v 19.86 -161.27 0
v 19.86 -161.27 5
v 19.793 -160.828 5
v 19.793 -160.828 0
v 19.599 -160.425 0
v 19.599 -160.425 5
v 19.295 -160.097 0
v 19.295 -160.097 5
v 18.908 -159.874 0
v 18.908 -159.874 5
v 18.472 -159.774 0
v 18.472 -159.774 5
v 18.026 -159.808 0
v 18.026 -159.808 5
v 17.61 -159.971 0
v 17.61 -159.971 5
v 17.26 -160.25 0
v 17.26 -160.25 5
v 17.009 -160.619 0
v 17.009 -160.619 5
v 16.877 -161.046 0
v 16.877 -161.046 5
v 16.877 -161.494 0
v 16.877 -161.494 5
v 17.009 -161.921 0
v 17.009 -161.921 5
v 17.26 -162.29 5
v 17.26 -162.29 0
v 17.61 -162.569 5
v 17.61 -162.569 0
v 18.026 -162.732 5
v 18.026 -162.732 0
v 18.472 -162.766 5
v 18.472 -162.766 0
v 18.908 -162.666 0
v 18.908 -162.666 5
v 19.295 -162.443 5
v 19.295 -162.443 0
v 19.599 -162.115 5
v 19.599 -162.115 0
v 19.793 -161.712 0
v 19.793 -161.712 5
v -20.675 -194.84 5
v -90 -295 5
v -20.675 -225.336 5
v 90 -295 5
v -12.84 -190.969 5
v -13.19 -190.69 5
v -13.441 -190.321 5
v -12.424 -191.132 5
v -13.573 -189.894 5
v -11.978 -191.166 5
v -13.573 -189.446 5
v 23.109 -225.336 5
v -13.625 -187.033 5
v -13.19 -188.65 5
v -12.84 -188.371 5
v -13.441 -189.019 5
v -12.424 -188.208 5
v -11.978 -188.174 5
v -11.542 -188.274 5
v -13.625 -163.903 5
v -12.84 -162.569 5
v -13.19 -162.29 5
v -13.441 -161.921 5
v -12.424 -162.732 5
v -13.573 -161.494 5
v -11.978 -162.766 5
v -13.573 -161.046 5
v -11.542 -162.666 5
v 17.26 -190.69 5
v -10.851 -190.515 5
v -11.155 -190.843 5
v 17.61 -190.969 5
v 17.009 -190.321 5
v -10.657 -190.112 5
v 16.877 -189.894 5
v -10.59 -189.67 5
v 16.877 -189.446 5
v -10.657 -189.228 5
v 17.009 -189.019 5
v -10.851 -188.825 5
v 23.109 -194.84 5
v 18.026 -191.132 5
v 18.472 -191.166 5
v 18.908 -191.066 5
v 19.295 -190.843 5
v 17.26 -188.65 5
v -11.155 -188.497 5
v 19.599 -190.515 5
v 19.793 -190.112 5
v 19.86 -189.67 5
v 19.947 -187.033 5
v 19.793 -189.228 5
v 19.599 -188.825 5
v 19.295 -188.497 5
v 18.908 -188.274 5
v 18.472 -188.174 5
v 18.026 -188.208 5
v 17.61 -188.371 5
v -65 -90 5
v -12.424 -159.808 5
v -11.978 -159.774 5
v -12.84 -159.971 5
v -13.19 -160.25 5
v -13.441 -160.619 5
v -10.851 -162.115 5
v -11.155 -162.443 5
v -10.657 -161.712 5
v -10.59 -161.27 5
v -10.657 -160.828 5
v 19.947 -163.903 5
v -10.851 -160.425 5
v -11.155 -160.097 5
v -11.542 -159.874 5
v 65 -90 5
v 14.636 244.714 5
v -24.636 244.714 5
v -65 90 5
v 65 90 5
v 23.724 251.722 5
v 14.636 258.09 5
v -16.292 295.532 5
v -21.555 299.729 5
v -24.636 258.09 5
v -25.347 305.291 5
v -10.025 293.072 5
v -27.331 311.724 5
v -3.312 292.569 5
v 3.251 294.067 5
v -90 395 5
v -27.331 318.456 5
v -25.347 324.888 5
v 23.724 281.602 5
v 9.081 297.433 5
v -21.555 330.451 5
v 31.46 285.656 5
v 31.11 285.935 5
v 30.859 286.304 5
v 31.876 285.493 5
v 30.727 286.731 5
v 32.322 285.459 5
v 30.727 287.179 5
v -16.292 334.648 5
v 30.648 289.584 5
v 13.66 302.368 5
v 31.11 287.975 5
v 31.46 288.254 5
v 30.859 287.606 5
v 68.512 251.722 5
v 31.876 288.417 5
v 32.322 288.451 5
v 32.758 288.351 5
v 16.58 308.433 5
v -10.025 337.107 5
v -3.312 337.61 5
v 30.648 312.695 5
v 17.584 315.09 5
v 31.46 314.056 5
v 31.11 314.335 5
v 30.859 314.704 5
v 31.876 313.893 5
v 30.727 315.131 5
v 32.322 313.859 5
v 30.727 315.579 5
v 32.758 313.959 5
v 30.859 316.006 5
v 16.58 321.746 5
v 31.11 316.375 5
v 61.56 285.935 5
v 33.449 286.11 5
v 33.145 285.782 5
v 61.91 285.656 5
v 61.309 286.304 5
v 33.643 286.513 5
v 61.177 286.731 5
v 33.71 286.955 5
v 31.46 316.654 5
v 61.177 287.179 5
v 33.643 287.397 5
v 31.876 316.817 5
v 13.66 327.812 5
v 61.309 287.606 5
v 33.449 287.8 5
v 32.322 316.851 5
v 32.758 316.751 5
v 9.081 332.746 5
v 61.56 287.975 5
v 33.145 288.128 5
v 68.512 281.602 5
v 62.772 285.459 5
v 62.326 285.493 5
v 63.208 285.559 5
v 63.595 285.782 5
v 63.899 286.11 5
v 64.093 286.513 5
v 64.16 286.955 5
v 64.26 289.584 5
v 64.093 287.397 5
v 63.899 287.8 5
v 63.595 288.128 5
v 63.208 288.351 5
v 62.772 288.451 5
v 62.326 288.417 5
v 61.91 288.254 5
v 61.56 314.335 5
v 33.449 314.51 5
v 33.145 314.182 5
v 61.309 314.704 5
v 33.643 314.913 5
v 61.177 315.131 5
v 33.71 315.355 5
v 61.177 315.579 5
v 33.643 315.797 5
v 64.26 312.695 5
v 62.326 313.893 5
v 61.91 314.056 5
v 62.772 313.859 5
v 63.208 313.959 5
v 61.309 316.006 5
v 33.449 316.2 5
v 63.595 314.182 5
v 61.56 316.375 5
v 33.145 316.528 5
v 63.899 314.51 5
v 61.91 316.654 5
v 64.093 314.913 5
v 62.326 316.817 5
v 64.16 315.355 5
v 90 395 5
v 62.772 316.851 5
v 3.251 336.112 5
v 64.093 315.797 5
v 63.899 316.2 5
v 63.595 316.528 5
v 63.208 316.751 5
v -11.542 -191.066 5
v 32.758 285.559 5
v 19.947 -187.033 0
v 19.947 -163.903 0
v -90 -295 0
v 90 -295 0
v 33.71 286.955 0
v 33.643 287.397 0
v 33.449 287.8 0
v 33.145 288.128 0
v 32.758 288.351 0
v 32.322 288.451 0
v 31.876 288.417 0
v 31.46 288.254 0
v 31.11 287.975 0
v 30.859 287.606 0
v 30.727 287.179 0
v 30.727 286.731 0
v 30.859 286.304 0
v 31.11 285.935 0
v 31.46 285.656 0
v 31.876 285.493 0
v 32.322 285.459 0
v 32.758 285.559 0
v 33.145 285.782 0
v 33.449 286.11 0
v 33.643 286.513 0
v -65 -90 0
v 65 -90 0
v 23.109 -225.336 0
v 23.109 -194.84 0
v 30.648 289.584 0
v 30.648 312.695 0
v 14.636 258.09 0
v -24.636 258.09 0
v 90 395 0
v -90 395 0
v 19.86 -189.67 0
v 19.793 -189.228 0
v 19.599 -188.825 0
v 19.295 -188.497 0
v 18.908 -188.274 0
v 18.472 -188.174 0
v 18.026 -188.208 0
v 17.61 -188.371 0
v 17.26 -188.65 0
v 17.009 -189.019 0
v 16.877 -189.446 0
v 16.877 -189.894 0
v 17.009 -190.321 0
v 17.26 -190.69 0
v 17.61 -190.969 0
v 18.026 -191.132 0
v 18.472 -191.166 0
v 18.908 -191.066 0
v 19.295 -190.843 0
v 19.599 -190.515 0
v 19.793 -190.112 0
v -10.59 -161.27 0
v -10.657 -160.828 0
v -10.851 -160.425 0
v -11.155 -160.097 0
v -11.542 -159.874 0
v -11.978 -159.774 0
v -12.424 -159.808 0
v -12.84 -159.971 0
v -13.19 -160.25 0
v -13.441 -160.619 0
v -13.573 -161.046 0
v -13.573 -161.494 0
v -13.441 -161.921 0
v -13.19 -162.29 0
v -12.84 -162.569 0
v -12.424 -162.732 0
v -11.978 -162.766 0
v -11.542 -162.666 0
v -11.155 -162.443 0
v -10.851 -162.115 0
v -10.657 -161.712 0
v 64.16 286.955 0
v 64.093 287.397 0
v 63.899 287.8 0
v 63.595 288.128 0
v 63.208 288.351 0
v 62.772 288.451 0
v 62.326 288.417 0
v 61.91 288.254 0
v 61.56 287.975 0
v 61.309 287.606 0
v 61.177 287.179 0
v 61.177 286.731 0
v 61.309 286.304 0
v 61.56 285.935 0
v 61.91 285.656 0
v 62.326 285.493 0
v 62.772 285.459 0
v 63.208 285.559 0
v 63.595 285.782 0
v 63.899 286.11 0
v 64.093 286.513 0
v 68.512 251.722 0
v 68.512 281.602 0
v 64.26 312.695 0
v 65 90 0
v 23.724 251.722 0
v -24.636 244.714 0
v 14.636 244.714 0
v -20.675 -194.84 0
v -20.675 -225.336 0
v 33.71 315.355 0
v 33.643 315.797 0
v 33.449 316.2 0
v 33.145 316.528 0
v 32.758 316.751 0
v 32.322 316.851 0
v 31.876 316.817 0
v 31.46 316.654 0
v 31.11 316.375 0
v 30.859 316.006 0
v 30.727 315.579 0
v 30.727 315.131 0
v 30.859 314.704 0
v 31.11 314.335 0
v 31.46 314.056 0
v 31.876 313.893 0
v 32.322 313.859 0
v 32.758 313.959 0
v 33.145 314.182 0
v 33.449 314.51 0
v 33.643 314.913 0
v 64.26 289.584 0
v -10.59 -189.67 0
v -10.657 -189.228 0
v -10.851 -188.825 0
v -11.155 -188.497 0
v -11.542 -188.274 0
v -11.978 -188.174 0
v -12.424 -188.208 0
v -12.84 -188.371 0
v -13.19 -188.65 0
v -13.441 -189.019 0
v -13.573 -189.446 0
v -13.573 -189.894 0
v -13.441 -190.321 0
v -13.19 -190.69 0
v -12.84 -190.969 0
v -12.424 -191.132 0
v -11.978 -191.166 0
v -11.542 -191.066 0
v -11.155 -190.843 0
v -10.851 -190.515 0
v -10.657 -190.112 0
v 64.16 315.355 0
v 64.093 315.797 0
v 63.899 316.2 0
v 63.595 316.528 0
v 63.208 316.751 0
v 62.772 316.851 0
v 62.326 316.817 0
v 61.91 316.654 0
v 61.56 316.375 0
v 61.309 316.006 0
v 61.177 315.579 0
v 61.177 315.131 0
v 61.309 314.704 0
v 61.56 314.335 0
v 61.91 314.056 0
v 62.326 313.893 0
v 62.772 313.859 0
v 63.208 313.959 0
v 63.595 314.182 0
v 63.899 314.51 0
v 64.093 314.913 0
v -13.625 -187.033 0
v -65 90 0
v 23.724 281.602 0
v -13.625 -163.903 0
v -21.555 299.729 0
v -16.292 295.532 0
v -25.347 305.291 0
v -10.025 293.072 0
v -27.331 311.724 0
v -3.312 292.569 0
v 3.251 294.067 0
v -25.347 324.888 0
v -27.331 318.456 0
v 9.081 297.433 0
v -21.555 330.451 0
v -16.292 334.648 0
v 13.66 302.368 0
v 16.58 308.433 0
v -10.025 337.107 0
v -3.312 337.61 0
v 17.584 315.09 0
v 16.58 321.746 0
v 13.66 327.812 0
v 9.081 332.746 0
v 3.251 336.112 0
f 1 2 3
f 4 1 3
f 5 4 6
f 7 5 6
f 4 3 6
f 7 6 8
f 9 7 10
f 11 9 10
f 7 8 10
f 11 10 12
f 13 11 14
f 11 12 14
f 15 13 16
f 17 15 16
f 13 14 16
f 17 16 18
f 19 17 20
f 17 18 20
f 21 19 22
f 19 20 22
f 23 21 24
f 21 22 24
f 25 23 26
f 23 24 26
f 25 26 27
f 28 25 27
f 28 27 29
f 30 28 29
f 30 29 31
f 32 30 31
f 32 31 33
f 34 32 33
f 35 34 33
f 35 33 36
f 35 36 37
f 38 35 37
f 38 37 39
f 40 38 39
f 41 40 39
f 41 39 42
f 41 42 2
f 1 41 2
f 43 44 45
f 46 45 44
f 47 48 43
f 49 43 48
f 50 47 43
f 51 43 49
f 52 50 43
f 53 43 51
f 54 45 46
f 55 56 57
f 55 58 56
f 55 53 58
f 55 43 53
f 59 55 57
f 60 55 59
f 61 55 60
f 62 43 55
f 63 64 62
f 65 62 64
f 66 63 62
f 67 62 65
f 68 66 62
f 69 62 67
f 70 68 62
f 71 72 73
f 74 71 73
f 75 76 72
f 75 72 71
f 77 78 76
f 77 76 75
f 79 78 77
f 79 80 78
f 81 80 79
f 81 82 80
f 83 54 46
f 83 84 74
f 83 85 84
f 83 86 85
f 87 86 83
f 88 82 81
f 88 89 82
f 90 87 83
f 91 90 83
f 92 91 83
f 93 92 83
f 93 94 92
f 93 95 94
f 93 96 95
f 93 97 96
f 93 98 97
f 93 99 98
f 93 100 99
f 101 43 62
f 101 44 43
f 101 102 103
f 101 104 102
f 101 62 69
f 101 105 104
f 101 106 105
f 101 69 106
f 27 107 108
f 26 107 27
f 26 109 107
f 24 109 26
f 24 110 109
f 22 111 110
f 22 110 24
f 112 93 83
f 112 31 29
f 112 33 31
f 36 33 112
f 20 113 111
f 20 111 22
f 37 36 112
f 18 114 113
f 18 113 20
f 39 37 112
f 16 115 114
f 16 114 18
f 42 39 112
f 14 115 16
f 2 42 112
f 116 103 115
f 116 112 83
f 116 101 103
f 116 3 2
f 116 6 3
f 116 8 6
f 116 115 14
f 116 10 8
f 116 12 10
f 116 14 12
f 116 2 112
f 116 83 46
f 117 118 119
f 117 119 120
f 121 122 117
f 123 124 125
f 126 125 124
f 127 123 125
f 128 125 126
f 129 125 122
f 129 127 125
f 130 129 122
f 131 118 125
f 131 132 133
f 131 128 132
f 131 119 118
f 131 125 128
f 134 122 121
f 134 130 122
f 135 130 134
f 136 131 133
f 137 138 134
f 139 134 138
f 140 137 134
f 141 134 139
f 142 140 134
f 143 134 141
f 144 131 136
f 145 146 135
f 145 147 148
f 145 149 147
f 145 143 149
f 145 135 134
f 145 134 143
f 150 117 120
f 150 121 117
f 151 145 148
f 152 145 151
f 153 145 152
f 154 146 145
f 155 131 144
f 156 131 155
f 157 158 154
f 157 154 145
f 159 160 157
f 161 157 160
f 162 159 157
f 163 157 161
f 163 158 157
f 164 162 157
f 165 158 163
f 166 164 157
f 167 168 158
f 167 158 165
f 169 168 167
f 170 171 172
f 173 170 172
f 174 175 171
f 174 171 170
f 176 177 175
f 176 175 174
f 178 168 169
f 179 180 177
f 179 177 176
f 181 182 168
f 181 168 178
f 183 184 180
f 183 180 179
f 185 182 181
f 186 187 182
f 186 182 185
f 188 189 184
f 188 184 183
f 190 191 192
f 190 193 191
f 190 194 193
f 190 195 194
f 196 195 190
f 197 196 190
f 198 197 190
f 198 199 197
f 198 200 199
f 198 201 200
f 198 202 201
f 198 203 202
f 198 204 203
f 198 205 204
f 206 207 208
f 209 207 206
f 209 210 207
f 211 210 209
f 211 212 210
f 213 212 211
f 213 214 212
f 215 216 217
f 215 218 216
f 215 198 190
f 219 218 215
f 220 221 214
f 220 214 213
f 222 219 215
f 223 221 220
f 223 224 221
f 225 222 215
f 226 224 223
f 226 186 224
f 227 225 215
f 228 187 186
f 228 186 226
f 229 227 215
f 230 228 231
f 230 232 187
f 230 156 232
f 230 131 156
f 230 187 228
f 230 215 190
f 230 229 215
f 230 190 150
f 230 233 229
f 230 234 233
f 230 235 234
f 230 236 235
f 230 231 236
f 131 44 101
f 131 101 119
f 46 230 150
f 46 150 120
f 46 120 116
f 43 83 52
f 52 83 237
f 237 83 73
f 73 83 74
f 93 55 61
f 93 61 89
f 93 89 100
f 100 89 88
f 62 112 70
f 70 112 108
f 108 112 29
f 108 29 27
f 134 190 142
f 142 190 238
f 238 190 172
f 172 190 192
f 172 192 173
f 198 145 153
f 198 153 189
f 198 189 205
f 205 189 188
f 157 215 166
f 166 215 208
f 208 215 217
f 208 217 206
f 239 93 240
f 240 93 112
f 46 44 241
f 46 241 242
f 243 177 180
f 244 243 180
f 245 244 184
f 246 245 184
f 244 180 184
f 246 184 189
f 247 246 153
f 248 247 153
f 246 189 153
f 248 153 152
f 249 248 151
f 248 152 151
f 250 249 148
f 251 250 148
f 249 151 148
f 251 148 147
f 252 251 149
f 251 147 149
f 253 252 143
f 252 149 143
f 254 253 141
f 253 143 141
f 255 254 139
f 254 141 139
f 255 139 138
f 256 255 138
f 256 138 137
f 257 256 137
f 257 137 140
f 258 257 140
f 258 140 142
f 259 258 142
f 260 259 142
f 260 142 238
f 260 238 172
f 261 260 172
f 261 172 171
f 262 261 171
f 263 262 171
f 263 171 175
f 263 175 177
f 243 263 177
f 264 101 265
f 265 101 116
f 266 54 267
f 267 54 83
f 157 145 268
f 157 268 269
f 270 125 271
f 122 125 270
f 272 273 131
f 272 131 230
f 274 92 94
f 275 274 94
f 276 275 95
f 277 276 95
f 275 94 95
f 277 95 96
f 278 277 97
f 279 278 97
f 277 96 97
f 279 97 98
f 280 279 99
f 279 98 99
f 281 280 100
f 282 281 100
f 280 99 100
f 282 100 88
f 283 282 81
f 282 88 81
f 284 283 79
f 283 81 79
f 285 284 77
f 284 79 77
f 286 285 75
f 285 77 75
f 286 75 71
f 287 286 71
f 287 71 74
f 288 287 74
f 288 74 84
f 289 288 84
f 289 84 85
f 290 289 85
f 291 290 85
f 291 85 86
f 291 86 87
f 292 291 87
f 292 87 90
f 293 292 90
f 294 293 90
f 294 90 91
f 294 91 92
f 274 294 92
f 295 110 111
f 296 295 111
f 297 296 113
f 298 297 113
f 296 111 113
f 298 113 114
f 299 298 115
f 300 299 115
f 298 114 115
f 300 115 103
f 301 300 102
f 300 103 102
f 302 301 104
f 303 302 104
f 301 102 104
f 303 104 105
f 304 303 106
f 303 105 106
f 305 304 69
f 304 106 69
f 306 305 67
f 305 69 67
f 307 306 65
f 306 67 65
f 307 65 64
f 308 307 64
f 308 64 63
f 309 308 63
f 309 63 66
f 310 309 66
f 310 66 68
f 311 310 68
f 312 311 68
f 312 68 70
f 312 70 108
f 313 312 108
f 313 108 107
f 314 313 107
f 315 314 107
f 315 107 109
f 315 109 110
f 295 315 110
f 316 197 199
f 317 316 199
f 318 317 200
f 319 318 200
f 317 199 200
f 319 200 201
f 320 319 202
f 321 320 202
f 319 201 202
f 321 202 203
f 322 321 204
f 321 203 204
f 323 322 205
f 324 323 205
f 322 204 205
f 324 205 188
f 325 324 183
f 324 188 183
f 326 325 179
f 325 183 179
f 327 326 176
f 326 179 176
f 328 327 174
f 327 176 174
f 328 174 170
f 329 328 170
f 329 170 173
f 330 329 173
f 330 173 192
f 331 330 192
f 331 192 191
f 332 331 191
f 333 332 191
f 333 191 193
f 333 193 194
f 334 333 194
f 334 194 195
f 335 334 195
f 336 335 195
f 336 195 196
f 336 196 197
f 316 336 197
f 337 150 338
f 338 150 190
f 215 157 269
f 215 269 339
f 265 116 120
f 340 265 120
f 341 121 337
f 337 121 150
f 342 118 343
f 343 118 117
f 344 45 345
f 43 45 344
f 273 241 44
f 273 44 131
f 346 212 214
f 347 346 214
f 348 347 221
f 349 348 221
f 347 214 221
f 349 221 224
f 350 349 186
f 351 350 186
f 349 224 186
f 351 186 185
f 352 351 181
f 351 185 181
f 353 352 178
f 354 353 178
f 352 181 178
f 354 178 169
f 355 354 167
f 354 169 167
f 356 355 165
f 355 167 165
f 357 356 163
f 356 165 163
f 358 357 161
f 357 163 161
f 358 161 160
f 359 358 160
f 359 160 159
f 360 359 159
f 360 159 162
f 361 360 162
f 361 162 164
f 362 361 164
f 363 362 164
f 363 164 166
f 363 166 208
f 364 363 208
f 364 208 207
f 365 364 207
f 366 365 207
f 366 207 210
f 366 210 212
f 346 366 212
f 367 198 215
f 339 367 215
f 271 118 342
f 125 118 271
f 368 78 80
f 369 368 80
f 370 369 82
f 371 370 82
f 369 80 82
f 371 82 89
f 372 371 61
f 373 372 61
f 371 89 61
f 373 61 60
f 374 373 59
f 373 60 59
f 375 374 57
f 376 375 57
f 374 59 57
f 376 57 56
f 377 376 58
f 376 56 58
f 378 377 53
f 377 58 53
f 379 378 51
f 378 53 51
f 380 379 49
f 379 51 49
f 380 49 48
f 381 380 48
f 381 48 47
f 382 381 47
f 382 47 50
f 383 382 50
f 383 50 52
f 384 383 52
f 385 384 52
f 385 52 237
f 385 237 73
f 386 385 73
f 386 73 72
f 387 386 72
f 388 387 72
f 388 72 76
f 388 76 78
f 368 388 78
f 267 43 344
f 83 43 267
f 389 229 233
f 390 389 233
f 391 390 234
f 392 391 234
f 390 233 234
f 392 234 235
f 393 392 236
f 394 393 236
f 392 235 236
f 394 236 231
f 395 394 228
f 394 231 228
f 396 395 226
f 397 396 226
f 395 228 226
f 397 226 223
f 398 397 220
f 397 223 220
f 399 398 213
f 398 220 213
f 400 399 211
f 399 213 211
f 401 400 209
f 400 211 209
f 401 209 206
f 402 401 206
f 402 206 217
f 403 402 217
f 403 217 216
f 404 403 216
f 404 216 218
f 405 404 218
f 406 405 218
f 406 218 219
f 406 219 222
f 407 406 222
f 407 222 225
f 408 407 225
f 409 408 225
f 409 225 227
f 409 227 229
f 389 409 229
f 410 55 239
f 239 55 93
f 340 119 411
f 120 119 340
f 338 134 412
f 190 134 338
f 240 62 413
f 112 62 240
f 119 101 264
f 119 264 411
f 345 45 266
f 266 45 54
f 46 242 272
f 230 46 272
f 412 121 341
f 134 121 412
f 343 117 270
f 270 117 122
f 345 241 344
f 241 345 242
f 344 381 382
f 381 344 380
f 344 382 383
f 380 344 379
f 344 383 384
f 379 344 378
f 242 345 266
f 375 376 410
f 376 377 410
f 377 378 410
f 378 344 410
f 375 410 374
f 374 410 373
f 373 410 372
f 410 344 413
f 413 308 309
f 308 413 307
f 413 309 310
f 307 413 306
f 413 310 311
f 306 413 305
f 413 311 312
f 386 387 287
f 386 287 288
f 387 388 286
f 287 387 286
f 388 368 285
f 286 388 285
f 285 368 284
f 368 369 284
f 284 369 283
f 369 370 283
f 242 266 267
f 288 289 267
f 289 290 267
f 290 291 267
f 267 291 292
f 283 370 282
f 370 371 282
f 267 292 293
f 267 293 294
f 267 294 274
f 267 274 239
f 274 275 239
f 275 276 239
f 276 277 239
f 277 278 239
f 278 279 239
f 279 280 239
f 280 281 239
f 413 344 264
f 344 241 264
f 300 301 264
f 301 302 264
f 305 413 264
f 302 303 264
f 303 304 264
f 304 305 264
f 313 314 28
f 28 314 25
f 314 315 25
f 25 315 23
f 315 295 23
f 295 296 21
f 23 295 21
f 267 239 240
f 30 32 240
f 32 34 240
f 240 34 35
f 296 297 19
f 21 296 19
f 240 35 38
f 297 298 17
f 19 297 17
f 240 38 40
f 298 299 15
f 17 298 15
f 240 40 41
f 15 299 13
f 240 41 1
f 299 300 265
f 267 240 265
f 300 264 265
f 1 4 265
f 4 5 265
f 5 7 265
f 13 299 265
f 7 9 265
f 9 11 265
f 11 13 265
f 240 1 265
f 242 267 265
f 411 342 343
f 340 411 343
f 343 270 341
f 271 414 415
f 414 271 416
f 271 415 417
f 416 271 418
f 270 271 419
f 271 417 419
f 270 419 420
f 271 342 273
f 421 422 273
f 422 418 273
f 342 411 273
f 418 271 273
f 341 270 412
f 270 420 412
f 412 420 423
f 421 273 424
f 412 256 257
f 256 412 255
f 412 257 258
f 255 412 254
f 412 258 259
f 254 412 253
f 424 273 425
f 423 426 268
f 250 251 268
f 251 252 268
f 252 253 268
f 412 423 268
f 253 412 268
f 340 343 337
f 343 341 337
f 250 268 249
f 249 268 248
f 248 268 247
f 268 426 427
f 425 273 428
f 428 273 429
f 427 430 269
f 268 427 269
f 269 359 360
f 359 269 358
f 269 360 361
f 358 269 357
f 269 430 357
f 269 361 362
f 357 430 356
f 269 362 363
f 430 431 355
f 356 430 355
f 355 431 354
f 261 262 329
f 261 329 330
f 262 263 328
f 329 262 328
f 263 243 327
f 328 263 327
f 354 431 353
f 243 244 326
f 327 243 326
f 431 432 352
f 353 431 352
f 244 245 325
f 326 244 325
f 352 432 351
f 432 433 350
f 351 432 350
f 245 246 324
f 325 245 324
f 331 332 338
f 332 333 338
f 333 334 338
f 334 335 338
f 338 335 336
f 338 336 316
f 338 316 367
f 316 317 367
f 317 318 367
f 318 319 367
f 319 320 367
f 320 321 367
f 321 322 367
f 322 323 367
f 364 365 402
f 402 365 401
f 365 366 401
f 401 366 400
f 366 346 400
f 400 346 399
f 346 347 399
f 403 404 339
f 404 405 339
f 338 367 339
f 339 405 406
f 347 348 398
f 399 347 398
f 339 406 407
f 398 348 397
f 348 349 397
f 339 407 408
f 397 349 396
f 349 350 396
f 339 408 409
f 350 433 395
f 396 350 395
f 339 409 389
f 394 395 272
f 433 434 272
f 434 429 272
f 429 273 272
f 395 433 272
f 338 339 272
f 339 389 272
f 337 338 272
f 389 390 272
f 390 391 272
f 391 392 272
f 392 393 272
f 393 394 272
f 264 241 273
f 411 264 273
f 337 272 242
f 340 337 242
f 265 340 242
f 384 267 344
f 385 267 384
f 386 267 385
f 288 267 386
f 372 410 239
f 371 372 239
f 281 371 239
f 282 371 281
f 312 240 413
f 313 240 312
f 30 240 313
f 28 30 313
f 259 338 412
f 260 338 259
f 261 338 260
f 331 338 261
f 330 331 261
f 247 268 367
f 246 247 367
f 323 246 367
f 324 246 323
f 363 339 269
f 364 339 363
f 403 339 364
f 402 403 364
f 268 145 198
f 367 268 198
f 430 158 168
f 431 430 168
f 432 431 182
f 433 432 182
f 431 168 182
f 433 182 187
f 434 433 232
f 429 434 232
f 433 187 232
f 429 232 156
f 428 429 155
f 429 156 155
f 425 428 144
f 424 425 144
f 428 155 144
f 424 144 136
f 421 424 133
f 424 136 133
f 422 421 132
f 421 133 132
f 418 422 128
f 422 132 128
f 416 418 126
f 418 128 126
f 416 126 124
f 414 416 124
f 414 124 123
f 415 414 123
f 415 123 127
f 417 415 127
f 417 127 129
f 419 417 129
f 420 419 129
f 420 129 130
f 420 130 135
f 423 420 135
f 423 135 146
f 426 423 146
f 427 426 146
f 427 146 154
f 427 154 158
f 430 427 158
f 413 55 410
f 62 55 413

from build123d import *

# Parameters (mm, degrees)
ESQUISSE1_W             = 180
ESQUISSE1_H             = 790
BOSS_EXTRU_1_DEPTH      = 5
ESQUISSE2_W             = 130
ESQUISSE2_H             = 180
ENL_V_MAT_EXTRU_1_DEPTH = 406.154291598
ESQUISSE3_W             = 180
ESQUISSE3_H             = 100
ENL_V_MAT_EXTRU_2_DEPTH = 5
ESQUISSE4_R             = 22.583693943
ESQUISSE4_W             = 39.272250948
ESQUISSE4_H             = 13.375687181
ENL_V_MAT_EXTRU_3_DEPTH = 10
ESQUISSE6_R             = 1.5
ESQUISSE6_W             = 43.78333401
ESQUISSE6_H             = 30.495607997
ESQUISSE6_W_2           = 33.572233796
ESQUISSE6_H_2           = 23.130308998
ENL_V_MAT_EXTRU_4_DEPTH = 10
ESQUISSE7_R             = 1.5
ESQUISSE7_W             = 44.788511225
ESQUISSE7_H             = 29.879964446
ESQUISSE7_W_2           = 33.612496144
ESQUISSE7_H_2           = 23.111104951
ENL_V_MAT_EXTRU_5_DEPTH = 10


with BuildPart() as part:
    # Esquisse1 → Boss.-Extru.1 (new body)
    with BuildSketch(Plane.XY):
        Rectangle(ESQUISSE1_W, ESQUISSE1_H)
    extrude(amount=BOSS_EXTRU_1_DEPTH)

    # Esquisse2 → Enlèv. mat.-Extru.1 (cut, through all)
    with BuildSketch(Plane.XY.offset(5)):
        Rectangle(ESQUISSE2_W, ESQUISSE2_H)
    extrude(amount=-ENL_V_MAT_EXTRU_1_DEPTH, mode=Mode.SUBTRACT)

    # Esquisse3 → Enlèv. mat.-Extru.2 (cut)
    with BuildSketch(Plane.XY.offset(5)):
        with Locations((0, -345)):
            Rectangle(ESQUISSE3_W, ESQUISSE3_H)
    extrude(amount=-ENL_V_MAT_EXTRU_2_DEPTH, mode=Mode.SUBTRACT)

    # Esquisse4 → Enlèv. mat.-Extru.3 (cut)
    with BuildSketch(Plane.XY.offset(5)):
        with Locations((-5, 315.089745962)):
            Circle(ESQUISSE4_R)
        with Locations((-5, 251.402324932)):
            Rectangle(ESQUISSE4_W, ESQUISSE4_H)
    extrude(amount=-ENL_V_MAT_EXTRU_3_DEPTH, mode=Mode.SUBTRACT)

    # Esquisse6 → Enlèv. mat.-Extru.4 (cut)
    with BuildSketch(Plane.XY.offset(5)):
        with Locations((-12.09, -189.669997694)):
            Circle(ESQUISSE6_R)
        with Locations((18.36, -189.669997694)):
            Circle(ESQUISSE6_R)
        with Locations((18.36, -161.269997694)):
            Circle(ESQUISSE6_R)
        with Locations((-12.09, -161.269997694)):
            Circle(ESQUISSE6_R)
        with Locations((1.217144904, -210.087843678)):
            Rectangle(ESQUISSE6_W, ESQUISSE6_H)
        with Locations((3.160802391, -175.467764734)):
            Rectangle(ESQUISSE6_W_2, ESQUISSE6_H_2)
    extrude(amount=-ENL_V_MAT_EXTRU_4_DEPTH, mode=Mode.SUBTRACT)

    # Esquisse7 → Enlèv. mat.-Extru.5 (cut)
    with BuildSketch(Plane.XY.offset(5)):
        with Locations((62.66, 315.355)):
            Circle(ESQUISSE7_R)
        with Locations((32.21, 315.355)):
            Circle(ESQUISSE7_R)
        with Locations((32.21, 286.955)):
            Circle(ESQUISSE7_R)
        with Locations((62.66, 286.955)):
            Circle(ESQUISSE7_R)
        with Locations((46.118085251, 266.662403555)):
            Rectangle(ESQUISSE7_W, ESQUISSE7_H)
        with Locations((47.453751928, 301.139447525)):
            Rectangle(ESQUISSE7_W_2, ESQUISSE7_H_2)
    extrude(amount=-ENL_V_MAT_EXTRU_5_DEPTH, mode=Mode.SUBTRACT)


solid = part.part
